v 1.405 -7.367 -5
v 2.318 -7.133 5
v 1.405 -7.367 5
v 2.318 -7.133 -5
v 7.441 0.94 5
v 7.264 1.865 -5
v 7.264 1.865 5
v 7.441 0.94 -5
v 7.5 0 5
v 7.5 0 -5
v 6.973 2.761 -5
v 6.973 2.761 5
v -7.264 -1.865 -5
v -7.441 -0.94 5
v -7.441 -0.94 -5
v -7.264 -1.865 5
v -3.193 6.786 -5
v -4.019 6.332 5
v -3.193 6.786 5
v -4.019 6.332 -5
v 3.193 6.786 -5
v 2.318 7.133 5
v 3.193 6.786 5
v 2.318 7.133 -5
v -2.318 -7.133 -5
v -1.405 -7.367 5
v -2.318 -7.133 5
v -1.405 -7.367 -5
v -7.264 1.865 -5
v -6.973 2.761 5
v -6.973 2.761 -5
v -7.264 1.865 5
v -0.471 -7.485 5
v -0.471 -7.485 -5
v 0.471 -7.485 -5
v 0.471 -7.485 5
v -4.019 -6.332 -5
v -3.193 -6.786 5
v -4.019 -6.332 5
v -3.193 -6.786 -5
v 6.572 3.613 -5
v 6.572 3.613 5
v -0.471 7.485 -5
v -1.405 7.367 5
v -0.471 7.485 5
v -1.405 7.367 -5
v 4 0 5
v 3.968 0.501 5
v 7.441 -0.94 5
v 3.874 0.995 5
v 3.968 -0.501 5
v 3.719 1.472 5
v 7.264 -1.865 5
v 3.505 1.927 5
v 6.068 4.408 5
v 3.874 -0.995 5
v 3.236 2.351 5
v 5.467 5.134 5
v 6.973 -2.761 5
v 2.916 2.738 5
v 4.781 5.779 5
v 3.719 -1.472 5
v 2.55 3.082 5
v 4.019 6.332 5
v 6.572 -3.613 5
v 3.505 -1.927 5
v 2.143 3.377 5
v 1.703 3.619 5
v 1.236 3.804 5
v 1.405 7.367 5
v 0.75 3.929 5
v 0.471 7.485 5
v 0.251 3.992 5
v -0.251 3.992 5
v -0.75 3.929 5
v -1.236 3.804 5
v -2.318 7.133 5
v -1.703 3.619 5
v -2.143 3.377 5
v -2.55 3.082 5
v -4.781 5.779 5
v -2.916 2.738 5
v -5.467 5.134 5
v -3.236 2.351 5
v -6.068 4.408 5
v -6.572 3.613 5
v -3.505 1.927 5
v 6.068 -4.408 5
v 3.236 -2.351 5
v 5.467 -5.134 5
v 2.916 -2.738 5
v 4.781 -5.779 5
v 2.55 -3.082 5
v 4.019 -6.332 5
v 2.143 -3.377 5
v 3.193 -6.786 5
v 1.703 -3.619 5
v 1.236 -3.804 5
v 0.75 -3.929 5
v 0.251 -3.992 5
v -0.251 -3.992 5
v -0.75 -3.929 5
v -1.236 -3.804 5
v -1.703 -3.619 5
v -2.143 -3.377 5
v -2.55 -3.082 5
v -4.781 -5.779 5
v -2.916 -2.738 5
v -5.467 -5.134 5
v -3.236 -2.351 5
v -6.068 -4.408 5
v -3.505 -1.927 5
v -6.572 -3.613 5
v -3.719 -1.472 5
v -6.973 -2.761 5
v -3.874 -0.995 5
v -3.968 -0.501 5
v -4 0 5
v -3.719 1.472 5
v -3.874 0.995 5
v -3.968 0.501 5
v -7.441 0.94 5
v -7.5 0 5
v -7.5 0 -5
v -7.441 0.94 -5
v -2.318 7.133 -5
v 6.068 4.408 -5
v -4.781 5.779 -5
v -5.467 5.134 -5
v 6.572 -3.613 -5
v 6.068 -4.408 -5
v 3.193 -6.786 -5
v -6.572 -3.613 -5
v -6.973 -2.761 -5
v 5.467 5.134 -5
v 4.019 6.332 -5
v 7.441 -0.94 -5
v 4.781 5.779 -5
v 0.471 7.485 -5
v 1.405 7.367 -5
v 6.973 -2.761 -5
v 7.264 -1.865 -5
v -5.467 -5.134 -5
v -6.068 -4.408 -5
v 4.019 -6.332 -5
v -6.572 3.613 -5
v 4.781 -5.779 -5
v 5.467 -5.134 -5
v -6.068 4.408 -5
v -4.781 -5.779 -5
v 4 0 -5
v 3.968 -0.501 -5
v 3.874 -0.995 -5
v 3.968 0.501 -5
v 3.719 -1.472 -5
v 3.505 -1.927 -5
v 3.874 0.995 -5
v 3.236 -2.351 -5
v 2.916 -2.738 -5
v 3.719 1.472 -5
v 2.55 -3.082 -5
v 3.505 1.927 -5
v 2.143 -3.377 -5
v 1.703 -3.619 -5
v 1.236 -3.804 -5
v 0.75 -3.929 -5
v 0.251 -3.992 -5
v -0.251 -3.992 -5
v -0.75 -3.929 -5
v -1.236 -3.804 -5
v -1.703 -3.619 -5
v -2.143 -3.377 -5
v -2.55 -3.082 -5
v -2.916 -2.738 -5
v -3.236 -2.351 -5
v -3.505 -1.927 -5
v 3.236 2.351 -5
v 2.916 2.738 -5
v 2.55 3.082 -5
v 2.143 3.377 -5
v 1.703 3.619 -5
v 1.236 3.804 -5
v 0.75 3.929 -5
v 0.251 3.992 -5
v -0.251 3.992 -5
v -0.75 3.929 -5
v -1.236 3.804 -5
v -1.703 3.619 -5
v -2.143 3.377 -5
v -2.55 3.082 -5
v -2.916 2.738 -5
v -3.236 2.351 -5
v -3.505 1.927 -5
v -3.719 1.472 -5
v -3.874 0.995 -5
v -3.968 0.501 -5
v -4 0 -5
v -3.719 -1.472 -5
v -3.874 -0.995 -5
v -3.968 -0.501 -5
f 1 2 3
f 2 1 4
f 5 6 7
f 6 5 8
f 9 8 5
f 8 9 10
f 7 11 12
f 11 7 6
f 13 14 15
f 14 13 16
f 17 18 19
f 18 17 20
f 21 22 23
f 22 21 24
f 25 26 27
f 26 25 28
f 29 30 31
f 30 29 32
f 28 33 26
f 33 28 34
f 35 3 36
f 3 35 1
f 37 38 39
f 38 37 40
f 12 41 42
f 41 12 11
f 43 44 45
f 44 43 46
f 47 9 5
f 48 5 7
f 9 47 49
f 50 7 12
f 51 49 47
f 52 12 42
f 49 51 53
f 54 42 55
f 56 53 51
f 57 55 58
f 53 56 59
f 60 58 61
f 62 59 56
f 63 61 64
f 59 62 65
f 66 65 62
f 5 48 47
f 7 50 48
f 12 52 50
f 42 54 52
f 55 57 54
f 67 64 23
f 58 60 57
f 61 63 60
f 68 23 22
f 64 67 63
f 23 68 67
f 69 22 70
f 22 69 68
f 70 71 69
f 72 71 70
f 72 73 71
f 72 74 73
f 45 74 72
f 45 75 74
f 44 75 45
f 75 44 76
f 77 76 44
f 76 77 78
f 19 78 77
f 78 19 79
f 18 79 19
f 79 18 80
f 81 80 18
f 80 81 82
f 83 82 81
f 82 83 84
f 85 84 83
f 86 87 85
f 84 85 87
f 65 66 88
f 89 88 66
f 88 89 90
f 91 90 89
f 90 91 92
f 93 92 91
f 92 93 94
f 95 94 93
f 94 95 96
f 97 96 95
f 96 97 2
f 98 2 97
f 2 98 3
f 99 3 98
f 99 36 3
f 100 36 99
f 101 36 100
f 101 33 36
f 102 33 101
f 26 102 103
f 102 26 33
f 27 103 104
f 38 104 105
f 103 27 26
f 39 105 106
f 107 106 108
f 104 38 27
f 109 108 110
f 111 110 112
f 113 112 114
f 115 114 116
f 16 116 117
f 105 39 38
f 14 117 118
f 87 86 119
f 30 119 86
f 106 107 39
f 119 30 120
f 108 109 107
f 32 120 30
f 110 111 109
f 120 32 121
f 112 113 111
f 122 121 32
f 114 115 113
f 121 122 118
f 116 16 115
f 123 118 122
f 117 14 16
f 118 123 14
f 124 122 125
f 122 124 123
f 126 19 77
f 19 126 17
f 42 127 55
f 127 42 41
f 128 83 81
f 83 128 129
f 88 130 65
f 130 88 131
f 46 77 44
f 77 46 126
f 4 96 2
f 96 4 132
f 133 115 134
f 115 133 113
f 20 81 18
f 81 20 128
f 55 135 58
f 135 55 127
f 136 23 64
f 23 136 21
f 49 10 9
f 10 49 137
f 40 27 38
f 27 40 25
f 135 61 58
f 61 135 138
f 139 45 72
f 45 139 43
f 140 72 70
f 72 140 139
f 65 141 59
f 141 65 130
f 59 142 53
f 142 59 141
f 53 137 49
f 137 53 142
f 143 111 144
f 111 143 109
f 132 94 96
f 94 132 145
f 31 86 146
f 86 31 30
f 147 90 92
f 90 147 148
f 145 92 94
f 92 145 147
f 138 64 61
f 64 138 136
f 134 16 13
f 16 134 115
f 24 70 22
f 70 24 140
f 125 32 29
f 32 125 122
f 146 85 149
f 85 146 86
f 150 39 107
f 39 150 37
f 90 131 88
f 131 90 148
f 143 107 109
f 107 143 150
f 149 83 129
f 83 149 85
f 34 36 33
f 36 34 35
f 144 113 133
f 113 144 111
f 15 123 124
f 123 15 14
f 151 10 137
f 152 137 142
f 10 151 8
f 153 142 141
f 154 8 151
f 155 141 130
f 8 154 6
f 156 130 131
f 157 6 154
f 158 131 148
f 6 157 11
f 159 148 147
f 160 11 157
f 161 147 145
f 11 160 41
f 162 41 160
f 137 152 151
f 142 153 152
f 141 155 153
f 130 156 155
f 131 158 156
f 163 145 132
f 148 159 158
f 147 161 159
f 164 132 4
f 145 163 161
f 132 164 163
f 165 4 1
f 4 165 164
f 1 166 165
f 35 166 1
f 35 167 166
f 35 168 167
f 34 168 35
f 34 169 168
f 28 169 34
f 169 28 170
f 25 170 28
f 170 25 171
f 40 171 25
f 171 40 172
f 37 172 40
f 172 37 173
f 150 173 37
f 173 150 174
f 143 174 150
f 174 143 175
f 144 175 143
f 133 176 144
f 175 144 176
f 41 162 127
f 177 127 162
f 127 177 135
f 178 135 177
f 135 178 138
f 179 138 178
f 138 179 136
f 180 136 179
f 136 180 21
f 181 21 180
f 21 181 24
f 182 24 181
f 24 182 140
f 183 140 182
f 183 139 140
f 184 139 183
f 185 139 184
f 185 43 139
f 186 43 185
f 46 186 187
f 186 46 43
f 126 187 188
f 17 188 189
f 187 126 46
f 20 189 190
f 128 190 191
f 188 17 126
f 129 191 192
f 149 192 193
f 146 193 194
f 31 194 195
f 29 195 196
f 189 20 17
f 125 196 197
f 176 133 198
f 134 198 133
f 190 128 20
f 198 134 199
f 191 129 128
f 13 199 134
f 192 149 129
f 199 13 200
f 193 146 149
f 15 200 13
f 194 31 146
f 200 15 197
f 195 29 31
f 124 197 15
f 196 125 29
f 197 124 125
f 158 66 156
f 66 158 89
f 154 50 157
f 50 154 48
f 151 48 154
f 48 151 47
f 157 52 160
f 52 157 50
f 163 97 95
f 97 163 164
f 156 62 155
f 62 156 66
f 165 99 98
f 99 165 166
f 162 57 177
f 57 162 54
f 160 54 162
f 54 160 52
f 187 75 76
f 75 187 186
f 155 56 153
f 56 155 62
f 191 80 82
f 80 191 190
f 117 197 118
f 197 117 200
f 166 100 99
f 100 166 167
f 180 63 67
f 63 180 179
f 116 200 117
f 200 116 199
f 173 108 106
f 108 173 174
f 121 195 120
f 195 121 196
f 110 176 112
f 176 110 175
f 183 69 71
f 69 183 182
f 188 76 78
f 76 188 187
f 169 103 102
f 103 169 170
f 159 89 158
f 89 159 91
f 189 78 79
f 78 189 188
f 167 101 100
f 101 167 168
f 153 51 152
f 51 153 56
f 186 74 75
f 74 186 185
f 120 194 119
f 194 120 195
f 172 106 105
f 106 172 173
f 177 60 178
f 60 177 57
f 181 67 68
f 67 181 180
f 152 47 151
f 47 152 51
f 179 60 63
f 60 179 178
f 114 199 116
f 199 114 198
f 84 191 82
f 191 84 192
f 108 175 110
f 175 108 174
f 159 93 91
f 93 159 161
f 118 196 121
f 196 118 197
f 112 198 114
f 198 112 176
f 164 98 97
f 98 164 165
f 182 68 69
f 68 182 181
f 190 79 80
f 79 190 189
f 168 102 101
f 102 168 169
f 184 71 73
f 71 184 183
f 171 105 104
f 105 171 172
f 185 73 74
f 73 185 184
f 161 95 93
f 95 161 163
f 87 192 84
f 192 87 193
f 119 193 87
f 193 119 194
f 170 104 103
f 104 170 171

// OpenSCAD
$fn = 50;


difference() {
	union() {
		translate(v = [0, 0, -5.0000000000]) {
			cylinder(h = 10, r = 7.5000000000);
		}
	}
	union() {
		translate(v = [0, 0, -100.0000000000]) {
			cylinder(h = 200, r = 4.0000000000);
		}
	}
}
